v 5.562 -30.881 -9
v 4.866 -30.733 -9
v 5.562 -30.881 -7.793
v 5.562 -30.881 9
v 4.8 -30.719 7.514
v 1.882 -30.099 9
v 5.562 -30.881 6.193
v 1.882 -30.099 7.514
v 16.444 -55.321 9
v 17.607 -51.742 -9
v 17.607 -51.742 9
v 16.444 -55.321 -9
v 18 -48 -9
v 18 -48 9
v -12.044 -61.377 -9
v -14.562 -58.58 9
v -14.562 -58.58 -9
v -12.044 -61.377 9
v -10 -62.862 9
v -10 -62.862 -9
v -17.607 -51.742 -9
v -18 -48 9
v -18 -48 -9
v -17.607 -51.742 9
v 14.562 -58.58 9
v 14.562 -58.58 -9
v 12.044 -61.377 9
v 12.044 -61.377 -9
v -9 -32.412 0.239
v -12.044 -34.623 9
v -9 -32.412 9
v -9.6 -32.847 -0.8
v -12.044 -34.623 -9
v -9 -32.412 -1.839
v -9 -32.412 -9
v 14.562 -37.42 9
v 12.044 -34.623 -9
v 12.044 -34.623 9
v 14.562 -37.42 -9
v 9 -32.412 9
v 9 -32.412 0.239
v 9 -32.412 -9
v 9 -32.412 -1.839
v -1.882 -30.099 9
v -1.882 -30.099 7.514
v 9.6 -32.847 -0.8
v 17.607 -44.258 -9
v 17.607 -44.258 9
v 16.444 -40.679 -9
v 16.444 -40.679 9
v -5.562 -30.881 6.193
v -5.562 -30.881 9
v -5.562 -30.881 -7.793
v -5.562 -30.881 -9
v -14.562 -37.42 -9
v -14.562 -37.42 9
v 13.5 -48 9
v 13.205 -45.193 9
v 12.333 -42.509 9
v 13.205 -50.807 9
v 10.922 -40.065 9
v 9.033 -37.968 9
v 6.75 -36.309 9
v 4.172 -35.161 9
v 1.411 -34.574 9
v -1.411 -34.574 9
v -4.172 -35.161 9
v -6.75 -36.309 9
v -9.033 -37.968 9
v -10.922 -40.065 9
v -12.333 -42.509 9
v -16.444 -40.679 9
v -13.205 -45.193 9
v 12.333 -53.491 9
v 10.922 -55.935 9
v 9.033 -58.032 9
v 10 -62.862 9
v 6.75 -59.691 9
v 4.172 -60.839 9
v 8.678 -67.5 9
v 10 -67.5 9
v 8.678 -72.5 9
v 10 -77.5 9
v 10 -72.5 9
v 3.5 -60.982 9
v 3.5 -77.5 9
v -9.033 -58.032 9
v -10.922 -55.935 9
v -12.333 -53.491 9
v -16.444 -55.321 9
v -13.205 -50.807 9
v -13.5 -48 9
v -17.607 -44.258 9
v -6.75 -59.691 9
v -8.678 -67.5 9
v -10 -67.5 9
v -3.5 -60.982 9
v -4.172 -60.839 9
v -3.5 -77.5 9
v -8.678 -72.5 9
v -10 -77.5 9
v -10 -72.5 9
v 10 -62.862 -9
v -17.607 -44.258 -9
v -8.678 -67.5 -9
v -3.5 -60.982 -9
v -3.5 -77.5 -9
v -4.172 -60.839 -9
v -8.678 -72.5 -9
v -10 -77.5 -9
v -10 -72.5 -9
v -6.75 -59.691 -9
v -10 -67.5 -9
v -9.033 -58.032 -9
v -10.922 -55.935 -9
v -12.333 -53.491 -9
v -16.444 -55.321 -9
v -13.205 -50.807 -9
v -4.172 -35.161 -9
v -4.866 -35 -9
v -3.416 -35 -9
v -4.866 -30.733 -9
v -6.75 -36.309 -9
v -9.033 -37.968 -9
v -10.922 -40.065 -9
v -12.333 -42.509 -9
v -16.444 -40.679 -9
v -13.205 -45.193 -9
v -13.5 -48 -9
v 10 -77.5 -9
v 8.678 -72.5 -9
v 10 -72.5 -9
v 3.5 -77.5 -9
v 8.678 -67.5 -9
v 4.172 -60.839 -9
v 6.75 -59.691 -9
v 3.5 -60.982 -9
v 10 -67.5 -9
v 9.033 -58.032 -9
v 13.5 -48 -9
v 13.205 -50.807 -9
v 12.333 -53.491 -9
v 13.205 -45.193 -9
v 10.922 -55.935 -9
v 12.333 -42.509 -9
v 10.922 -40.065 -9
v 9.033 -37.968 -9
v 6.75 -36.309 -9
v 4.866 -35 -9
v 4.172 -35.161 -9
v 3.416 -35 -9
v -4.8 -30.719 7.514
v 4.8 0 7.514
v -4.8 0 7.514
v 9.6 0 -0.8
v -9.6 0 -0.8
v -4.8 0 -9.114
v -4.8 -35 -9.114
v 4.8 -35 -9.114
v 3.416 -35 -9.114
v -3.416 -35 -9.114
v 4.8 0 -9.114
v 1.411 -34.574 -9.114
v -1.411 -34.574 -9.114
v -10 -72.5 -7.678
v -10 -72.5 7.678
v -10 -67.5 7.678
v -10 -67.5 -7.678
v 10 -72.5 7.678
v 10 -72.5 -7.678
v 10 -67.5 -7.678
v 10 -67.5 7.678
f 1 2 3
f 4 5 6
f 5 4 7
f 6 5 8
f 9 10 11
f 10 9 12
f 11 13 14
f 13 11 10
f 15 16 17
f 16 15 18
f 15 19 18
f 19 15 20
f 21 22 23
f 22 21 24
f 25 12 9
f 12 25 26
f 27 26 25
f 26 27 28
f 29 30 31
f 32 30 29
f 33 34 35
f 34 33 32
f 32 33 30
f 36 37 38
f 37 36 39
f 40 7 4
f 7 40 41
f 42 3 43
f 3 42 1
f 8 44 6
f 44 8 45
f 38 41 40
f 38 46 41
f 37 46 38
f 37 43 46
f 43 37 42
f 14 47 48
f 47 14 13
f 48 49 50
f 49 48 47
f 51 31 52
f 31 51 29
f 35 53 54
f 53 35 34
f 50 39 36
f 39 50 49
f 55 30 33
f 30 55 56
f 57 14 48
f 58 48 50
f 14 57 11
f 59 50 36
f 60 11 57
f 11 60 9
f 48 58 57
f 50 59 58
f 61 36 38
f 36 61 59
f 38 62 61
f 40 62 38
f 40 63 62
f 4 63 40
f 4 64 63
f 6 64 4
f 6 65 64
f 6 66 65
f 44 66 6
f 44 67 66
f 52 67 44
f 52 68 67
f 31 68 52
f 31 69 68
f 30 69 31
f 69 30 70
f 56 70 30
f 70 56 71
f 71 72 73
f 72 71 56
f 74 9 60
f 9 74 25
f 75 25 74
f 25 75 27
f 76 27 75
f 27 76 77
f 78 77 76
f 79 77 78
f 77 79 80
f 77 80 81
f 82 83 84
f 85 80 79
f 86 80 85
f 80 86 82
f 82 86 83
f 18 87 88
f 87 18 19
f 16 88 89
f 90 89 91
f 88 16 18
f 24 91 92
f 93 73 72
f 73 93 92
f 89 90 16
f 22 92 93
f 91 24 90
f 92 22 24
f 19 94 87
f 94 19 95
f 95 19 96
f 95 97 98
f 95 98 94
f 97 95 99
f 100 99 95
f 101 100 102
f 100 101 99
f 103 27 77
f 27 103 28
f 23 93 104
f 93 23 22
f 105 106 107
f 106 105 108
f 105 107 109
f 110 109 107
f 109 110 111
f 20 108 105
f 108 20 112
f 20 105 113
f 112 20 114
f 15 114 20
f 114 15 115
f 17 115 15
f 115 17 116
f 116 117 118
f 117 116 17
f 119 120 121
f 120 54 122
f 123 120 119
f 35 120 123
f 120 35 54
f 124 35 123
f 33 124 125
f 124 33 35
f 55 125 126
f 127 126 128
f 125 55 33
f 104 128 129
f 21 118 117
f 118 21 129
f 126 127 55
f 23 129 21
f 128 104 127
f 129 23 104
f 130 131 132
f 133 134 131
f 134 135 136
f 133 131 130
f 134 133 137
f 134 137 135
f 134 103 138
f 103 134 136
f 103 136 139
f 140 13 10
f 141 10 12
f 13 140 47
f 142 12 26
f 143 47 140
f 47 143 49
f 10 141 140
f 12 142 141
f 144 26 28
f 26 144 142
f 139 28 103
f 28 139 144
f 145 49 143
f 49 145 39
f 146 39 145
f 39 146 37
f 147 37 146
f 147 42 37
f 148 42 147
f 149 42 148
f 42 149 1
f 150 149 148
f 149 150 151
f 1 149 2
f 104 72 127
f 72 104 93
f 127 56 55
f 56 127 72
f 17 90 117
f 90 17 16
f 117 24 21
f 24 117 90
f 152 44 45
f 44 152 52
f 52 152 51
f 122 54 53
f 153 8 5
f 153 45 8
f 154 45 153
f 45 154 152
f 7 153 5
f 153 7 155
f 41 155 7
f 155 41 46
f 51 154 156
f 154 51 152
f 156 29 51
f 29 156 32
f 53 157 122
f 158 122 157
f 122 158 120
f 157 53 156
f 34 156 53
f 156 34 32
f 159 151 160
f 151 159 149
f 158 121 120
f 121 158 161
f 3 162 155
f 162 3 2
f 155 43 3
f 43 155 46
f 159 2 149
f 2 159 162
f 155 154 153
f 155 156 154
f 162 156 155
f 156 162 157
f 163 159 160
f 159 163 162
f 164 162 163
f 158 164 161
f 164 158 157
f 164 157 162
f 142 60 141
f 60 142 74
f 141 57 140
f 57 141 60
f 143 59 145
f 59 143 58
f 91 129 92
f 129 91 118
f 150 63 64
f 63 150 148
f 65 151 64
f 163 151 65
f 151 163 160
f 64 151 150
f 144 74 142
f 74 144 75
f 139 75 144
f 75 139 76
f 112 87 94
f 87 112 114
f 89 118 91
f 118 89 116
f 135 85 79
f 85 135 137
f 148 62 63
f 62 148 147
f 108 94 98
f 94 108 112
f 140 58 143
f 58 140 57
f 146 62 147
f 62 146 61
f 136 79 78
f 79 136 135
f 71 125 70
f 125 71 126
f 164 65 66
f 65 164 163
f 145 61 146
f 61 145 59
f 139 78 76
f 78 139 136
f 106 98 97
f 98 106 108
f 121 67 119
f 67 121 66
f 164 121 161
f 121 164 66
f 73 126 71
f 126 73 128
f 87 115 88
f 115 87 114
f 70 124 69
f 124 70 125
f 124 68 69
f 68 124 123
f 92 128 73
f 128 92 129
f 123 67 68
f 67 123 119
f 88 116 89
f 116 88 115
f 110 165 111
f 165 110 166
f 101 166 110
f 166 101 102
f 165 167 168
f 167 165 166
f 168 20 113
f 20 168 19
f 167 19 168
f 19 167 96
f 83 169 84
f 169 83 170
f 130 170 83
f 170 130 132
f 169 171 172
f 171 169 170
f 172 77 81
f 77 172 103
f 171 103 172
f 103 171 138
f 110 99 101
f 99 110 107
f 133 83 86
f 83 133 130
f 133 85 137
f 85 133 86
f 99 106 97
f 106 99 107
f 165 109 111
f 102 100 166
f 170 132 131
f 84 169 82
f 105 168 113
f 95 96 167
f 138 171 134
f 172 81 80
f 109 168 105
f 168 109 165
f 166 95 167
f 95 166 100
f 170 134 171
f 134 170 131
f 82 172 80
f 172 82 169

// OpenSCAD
rotate([90, 0, 0]){

difference() 
{
//odecet pro zarezy na utazeni


difference() 
{ 
// ode�et distan�n� mezery


union() 
{
// p�i�ten� patic pro sta�en�

difference() 
{ 
// diffference pro  otvor pro osazen� na ty�



union() 
{
// union pro v�lec napojen� na cylinder pro zasazen� do rukojeti

union() 
// union pro p�ipojen� cylinderu na v�lec
{


//cylinder(h = 14, r1 = 17, r2 = 10, center = true); 
//cylinder-nepouzite skoseni napojeni tyce pro usazeni v rukojeti

//zakladn�
#translate([0,9,48]) rotate ([90,0,0])cylinder(h = 18, r=18);
// 40 je nastavena vnitrni prumer na 35 a vnejsi na 40
        
} 
translate([0,-0.8,0]) rotate ([0,0,0]) cylinder(h=35, r=9.6,$fn=6);

//fn tisk byl s r 9.5



 
// umisteni ctverce pro dosazeni do rukojeti
//tloustka operky je 4mm + 14mm pro zesileni
//19 je posun nahoru a dolu/////35 vyska propojky
}
translate([0,10,48]) rotate ([90,0,0])cylinder(h = 20, r=13.5);
// odecitaci valec pro otvor na osazen� ty�e

//27 je vnitrni prumer

}
translate([0,0,70]) rotate ([90,0,0]) cube(size = [20,15,18], center = true);
//sloupky pro utazeni
}
translate([0,10,80]) rotate ([0,0,0])cube(size = [7,50,40], center = true);
//odecet distancni mezery
}        

difference(){

translate([0,0,70]) rotate ([0,0,45]) cube(size = [30,30,5], center = true);
translate([0,0,70]) rotate ([0,0,45]) cube(size = [25,25,15], center = true);
}}  
//odecet od krychle je odectena mesi krychle cimz vznikne cosi aka ctvercovy toroid kterym je az odectena vlastni stahovaci operka


//# pro zviditeleneni
//priblizeni shift+prav tlacitko mysi+ pousouvani dopredu/dozadu
}
